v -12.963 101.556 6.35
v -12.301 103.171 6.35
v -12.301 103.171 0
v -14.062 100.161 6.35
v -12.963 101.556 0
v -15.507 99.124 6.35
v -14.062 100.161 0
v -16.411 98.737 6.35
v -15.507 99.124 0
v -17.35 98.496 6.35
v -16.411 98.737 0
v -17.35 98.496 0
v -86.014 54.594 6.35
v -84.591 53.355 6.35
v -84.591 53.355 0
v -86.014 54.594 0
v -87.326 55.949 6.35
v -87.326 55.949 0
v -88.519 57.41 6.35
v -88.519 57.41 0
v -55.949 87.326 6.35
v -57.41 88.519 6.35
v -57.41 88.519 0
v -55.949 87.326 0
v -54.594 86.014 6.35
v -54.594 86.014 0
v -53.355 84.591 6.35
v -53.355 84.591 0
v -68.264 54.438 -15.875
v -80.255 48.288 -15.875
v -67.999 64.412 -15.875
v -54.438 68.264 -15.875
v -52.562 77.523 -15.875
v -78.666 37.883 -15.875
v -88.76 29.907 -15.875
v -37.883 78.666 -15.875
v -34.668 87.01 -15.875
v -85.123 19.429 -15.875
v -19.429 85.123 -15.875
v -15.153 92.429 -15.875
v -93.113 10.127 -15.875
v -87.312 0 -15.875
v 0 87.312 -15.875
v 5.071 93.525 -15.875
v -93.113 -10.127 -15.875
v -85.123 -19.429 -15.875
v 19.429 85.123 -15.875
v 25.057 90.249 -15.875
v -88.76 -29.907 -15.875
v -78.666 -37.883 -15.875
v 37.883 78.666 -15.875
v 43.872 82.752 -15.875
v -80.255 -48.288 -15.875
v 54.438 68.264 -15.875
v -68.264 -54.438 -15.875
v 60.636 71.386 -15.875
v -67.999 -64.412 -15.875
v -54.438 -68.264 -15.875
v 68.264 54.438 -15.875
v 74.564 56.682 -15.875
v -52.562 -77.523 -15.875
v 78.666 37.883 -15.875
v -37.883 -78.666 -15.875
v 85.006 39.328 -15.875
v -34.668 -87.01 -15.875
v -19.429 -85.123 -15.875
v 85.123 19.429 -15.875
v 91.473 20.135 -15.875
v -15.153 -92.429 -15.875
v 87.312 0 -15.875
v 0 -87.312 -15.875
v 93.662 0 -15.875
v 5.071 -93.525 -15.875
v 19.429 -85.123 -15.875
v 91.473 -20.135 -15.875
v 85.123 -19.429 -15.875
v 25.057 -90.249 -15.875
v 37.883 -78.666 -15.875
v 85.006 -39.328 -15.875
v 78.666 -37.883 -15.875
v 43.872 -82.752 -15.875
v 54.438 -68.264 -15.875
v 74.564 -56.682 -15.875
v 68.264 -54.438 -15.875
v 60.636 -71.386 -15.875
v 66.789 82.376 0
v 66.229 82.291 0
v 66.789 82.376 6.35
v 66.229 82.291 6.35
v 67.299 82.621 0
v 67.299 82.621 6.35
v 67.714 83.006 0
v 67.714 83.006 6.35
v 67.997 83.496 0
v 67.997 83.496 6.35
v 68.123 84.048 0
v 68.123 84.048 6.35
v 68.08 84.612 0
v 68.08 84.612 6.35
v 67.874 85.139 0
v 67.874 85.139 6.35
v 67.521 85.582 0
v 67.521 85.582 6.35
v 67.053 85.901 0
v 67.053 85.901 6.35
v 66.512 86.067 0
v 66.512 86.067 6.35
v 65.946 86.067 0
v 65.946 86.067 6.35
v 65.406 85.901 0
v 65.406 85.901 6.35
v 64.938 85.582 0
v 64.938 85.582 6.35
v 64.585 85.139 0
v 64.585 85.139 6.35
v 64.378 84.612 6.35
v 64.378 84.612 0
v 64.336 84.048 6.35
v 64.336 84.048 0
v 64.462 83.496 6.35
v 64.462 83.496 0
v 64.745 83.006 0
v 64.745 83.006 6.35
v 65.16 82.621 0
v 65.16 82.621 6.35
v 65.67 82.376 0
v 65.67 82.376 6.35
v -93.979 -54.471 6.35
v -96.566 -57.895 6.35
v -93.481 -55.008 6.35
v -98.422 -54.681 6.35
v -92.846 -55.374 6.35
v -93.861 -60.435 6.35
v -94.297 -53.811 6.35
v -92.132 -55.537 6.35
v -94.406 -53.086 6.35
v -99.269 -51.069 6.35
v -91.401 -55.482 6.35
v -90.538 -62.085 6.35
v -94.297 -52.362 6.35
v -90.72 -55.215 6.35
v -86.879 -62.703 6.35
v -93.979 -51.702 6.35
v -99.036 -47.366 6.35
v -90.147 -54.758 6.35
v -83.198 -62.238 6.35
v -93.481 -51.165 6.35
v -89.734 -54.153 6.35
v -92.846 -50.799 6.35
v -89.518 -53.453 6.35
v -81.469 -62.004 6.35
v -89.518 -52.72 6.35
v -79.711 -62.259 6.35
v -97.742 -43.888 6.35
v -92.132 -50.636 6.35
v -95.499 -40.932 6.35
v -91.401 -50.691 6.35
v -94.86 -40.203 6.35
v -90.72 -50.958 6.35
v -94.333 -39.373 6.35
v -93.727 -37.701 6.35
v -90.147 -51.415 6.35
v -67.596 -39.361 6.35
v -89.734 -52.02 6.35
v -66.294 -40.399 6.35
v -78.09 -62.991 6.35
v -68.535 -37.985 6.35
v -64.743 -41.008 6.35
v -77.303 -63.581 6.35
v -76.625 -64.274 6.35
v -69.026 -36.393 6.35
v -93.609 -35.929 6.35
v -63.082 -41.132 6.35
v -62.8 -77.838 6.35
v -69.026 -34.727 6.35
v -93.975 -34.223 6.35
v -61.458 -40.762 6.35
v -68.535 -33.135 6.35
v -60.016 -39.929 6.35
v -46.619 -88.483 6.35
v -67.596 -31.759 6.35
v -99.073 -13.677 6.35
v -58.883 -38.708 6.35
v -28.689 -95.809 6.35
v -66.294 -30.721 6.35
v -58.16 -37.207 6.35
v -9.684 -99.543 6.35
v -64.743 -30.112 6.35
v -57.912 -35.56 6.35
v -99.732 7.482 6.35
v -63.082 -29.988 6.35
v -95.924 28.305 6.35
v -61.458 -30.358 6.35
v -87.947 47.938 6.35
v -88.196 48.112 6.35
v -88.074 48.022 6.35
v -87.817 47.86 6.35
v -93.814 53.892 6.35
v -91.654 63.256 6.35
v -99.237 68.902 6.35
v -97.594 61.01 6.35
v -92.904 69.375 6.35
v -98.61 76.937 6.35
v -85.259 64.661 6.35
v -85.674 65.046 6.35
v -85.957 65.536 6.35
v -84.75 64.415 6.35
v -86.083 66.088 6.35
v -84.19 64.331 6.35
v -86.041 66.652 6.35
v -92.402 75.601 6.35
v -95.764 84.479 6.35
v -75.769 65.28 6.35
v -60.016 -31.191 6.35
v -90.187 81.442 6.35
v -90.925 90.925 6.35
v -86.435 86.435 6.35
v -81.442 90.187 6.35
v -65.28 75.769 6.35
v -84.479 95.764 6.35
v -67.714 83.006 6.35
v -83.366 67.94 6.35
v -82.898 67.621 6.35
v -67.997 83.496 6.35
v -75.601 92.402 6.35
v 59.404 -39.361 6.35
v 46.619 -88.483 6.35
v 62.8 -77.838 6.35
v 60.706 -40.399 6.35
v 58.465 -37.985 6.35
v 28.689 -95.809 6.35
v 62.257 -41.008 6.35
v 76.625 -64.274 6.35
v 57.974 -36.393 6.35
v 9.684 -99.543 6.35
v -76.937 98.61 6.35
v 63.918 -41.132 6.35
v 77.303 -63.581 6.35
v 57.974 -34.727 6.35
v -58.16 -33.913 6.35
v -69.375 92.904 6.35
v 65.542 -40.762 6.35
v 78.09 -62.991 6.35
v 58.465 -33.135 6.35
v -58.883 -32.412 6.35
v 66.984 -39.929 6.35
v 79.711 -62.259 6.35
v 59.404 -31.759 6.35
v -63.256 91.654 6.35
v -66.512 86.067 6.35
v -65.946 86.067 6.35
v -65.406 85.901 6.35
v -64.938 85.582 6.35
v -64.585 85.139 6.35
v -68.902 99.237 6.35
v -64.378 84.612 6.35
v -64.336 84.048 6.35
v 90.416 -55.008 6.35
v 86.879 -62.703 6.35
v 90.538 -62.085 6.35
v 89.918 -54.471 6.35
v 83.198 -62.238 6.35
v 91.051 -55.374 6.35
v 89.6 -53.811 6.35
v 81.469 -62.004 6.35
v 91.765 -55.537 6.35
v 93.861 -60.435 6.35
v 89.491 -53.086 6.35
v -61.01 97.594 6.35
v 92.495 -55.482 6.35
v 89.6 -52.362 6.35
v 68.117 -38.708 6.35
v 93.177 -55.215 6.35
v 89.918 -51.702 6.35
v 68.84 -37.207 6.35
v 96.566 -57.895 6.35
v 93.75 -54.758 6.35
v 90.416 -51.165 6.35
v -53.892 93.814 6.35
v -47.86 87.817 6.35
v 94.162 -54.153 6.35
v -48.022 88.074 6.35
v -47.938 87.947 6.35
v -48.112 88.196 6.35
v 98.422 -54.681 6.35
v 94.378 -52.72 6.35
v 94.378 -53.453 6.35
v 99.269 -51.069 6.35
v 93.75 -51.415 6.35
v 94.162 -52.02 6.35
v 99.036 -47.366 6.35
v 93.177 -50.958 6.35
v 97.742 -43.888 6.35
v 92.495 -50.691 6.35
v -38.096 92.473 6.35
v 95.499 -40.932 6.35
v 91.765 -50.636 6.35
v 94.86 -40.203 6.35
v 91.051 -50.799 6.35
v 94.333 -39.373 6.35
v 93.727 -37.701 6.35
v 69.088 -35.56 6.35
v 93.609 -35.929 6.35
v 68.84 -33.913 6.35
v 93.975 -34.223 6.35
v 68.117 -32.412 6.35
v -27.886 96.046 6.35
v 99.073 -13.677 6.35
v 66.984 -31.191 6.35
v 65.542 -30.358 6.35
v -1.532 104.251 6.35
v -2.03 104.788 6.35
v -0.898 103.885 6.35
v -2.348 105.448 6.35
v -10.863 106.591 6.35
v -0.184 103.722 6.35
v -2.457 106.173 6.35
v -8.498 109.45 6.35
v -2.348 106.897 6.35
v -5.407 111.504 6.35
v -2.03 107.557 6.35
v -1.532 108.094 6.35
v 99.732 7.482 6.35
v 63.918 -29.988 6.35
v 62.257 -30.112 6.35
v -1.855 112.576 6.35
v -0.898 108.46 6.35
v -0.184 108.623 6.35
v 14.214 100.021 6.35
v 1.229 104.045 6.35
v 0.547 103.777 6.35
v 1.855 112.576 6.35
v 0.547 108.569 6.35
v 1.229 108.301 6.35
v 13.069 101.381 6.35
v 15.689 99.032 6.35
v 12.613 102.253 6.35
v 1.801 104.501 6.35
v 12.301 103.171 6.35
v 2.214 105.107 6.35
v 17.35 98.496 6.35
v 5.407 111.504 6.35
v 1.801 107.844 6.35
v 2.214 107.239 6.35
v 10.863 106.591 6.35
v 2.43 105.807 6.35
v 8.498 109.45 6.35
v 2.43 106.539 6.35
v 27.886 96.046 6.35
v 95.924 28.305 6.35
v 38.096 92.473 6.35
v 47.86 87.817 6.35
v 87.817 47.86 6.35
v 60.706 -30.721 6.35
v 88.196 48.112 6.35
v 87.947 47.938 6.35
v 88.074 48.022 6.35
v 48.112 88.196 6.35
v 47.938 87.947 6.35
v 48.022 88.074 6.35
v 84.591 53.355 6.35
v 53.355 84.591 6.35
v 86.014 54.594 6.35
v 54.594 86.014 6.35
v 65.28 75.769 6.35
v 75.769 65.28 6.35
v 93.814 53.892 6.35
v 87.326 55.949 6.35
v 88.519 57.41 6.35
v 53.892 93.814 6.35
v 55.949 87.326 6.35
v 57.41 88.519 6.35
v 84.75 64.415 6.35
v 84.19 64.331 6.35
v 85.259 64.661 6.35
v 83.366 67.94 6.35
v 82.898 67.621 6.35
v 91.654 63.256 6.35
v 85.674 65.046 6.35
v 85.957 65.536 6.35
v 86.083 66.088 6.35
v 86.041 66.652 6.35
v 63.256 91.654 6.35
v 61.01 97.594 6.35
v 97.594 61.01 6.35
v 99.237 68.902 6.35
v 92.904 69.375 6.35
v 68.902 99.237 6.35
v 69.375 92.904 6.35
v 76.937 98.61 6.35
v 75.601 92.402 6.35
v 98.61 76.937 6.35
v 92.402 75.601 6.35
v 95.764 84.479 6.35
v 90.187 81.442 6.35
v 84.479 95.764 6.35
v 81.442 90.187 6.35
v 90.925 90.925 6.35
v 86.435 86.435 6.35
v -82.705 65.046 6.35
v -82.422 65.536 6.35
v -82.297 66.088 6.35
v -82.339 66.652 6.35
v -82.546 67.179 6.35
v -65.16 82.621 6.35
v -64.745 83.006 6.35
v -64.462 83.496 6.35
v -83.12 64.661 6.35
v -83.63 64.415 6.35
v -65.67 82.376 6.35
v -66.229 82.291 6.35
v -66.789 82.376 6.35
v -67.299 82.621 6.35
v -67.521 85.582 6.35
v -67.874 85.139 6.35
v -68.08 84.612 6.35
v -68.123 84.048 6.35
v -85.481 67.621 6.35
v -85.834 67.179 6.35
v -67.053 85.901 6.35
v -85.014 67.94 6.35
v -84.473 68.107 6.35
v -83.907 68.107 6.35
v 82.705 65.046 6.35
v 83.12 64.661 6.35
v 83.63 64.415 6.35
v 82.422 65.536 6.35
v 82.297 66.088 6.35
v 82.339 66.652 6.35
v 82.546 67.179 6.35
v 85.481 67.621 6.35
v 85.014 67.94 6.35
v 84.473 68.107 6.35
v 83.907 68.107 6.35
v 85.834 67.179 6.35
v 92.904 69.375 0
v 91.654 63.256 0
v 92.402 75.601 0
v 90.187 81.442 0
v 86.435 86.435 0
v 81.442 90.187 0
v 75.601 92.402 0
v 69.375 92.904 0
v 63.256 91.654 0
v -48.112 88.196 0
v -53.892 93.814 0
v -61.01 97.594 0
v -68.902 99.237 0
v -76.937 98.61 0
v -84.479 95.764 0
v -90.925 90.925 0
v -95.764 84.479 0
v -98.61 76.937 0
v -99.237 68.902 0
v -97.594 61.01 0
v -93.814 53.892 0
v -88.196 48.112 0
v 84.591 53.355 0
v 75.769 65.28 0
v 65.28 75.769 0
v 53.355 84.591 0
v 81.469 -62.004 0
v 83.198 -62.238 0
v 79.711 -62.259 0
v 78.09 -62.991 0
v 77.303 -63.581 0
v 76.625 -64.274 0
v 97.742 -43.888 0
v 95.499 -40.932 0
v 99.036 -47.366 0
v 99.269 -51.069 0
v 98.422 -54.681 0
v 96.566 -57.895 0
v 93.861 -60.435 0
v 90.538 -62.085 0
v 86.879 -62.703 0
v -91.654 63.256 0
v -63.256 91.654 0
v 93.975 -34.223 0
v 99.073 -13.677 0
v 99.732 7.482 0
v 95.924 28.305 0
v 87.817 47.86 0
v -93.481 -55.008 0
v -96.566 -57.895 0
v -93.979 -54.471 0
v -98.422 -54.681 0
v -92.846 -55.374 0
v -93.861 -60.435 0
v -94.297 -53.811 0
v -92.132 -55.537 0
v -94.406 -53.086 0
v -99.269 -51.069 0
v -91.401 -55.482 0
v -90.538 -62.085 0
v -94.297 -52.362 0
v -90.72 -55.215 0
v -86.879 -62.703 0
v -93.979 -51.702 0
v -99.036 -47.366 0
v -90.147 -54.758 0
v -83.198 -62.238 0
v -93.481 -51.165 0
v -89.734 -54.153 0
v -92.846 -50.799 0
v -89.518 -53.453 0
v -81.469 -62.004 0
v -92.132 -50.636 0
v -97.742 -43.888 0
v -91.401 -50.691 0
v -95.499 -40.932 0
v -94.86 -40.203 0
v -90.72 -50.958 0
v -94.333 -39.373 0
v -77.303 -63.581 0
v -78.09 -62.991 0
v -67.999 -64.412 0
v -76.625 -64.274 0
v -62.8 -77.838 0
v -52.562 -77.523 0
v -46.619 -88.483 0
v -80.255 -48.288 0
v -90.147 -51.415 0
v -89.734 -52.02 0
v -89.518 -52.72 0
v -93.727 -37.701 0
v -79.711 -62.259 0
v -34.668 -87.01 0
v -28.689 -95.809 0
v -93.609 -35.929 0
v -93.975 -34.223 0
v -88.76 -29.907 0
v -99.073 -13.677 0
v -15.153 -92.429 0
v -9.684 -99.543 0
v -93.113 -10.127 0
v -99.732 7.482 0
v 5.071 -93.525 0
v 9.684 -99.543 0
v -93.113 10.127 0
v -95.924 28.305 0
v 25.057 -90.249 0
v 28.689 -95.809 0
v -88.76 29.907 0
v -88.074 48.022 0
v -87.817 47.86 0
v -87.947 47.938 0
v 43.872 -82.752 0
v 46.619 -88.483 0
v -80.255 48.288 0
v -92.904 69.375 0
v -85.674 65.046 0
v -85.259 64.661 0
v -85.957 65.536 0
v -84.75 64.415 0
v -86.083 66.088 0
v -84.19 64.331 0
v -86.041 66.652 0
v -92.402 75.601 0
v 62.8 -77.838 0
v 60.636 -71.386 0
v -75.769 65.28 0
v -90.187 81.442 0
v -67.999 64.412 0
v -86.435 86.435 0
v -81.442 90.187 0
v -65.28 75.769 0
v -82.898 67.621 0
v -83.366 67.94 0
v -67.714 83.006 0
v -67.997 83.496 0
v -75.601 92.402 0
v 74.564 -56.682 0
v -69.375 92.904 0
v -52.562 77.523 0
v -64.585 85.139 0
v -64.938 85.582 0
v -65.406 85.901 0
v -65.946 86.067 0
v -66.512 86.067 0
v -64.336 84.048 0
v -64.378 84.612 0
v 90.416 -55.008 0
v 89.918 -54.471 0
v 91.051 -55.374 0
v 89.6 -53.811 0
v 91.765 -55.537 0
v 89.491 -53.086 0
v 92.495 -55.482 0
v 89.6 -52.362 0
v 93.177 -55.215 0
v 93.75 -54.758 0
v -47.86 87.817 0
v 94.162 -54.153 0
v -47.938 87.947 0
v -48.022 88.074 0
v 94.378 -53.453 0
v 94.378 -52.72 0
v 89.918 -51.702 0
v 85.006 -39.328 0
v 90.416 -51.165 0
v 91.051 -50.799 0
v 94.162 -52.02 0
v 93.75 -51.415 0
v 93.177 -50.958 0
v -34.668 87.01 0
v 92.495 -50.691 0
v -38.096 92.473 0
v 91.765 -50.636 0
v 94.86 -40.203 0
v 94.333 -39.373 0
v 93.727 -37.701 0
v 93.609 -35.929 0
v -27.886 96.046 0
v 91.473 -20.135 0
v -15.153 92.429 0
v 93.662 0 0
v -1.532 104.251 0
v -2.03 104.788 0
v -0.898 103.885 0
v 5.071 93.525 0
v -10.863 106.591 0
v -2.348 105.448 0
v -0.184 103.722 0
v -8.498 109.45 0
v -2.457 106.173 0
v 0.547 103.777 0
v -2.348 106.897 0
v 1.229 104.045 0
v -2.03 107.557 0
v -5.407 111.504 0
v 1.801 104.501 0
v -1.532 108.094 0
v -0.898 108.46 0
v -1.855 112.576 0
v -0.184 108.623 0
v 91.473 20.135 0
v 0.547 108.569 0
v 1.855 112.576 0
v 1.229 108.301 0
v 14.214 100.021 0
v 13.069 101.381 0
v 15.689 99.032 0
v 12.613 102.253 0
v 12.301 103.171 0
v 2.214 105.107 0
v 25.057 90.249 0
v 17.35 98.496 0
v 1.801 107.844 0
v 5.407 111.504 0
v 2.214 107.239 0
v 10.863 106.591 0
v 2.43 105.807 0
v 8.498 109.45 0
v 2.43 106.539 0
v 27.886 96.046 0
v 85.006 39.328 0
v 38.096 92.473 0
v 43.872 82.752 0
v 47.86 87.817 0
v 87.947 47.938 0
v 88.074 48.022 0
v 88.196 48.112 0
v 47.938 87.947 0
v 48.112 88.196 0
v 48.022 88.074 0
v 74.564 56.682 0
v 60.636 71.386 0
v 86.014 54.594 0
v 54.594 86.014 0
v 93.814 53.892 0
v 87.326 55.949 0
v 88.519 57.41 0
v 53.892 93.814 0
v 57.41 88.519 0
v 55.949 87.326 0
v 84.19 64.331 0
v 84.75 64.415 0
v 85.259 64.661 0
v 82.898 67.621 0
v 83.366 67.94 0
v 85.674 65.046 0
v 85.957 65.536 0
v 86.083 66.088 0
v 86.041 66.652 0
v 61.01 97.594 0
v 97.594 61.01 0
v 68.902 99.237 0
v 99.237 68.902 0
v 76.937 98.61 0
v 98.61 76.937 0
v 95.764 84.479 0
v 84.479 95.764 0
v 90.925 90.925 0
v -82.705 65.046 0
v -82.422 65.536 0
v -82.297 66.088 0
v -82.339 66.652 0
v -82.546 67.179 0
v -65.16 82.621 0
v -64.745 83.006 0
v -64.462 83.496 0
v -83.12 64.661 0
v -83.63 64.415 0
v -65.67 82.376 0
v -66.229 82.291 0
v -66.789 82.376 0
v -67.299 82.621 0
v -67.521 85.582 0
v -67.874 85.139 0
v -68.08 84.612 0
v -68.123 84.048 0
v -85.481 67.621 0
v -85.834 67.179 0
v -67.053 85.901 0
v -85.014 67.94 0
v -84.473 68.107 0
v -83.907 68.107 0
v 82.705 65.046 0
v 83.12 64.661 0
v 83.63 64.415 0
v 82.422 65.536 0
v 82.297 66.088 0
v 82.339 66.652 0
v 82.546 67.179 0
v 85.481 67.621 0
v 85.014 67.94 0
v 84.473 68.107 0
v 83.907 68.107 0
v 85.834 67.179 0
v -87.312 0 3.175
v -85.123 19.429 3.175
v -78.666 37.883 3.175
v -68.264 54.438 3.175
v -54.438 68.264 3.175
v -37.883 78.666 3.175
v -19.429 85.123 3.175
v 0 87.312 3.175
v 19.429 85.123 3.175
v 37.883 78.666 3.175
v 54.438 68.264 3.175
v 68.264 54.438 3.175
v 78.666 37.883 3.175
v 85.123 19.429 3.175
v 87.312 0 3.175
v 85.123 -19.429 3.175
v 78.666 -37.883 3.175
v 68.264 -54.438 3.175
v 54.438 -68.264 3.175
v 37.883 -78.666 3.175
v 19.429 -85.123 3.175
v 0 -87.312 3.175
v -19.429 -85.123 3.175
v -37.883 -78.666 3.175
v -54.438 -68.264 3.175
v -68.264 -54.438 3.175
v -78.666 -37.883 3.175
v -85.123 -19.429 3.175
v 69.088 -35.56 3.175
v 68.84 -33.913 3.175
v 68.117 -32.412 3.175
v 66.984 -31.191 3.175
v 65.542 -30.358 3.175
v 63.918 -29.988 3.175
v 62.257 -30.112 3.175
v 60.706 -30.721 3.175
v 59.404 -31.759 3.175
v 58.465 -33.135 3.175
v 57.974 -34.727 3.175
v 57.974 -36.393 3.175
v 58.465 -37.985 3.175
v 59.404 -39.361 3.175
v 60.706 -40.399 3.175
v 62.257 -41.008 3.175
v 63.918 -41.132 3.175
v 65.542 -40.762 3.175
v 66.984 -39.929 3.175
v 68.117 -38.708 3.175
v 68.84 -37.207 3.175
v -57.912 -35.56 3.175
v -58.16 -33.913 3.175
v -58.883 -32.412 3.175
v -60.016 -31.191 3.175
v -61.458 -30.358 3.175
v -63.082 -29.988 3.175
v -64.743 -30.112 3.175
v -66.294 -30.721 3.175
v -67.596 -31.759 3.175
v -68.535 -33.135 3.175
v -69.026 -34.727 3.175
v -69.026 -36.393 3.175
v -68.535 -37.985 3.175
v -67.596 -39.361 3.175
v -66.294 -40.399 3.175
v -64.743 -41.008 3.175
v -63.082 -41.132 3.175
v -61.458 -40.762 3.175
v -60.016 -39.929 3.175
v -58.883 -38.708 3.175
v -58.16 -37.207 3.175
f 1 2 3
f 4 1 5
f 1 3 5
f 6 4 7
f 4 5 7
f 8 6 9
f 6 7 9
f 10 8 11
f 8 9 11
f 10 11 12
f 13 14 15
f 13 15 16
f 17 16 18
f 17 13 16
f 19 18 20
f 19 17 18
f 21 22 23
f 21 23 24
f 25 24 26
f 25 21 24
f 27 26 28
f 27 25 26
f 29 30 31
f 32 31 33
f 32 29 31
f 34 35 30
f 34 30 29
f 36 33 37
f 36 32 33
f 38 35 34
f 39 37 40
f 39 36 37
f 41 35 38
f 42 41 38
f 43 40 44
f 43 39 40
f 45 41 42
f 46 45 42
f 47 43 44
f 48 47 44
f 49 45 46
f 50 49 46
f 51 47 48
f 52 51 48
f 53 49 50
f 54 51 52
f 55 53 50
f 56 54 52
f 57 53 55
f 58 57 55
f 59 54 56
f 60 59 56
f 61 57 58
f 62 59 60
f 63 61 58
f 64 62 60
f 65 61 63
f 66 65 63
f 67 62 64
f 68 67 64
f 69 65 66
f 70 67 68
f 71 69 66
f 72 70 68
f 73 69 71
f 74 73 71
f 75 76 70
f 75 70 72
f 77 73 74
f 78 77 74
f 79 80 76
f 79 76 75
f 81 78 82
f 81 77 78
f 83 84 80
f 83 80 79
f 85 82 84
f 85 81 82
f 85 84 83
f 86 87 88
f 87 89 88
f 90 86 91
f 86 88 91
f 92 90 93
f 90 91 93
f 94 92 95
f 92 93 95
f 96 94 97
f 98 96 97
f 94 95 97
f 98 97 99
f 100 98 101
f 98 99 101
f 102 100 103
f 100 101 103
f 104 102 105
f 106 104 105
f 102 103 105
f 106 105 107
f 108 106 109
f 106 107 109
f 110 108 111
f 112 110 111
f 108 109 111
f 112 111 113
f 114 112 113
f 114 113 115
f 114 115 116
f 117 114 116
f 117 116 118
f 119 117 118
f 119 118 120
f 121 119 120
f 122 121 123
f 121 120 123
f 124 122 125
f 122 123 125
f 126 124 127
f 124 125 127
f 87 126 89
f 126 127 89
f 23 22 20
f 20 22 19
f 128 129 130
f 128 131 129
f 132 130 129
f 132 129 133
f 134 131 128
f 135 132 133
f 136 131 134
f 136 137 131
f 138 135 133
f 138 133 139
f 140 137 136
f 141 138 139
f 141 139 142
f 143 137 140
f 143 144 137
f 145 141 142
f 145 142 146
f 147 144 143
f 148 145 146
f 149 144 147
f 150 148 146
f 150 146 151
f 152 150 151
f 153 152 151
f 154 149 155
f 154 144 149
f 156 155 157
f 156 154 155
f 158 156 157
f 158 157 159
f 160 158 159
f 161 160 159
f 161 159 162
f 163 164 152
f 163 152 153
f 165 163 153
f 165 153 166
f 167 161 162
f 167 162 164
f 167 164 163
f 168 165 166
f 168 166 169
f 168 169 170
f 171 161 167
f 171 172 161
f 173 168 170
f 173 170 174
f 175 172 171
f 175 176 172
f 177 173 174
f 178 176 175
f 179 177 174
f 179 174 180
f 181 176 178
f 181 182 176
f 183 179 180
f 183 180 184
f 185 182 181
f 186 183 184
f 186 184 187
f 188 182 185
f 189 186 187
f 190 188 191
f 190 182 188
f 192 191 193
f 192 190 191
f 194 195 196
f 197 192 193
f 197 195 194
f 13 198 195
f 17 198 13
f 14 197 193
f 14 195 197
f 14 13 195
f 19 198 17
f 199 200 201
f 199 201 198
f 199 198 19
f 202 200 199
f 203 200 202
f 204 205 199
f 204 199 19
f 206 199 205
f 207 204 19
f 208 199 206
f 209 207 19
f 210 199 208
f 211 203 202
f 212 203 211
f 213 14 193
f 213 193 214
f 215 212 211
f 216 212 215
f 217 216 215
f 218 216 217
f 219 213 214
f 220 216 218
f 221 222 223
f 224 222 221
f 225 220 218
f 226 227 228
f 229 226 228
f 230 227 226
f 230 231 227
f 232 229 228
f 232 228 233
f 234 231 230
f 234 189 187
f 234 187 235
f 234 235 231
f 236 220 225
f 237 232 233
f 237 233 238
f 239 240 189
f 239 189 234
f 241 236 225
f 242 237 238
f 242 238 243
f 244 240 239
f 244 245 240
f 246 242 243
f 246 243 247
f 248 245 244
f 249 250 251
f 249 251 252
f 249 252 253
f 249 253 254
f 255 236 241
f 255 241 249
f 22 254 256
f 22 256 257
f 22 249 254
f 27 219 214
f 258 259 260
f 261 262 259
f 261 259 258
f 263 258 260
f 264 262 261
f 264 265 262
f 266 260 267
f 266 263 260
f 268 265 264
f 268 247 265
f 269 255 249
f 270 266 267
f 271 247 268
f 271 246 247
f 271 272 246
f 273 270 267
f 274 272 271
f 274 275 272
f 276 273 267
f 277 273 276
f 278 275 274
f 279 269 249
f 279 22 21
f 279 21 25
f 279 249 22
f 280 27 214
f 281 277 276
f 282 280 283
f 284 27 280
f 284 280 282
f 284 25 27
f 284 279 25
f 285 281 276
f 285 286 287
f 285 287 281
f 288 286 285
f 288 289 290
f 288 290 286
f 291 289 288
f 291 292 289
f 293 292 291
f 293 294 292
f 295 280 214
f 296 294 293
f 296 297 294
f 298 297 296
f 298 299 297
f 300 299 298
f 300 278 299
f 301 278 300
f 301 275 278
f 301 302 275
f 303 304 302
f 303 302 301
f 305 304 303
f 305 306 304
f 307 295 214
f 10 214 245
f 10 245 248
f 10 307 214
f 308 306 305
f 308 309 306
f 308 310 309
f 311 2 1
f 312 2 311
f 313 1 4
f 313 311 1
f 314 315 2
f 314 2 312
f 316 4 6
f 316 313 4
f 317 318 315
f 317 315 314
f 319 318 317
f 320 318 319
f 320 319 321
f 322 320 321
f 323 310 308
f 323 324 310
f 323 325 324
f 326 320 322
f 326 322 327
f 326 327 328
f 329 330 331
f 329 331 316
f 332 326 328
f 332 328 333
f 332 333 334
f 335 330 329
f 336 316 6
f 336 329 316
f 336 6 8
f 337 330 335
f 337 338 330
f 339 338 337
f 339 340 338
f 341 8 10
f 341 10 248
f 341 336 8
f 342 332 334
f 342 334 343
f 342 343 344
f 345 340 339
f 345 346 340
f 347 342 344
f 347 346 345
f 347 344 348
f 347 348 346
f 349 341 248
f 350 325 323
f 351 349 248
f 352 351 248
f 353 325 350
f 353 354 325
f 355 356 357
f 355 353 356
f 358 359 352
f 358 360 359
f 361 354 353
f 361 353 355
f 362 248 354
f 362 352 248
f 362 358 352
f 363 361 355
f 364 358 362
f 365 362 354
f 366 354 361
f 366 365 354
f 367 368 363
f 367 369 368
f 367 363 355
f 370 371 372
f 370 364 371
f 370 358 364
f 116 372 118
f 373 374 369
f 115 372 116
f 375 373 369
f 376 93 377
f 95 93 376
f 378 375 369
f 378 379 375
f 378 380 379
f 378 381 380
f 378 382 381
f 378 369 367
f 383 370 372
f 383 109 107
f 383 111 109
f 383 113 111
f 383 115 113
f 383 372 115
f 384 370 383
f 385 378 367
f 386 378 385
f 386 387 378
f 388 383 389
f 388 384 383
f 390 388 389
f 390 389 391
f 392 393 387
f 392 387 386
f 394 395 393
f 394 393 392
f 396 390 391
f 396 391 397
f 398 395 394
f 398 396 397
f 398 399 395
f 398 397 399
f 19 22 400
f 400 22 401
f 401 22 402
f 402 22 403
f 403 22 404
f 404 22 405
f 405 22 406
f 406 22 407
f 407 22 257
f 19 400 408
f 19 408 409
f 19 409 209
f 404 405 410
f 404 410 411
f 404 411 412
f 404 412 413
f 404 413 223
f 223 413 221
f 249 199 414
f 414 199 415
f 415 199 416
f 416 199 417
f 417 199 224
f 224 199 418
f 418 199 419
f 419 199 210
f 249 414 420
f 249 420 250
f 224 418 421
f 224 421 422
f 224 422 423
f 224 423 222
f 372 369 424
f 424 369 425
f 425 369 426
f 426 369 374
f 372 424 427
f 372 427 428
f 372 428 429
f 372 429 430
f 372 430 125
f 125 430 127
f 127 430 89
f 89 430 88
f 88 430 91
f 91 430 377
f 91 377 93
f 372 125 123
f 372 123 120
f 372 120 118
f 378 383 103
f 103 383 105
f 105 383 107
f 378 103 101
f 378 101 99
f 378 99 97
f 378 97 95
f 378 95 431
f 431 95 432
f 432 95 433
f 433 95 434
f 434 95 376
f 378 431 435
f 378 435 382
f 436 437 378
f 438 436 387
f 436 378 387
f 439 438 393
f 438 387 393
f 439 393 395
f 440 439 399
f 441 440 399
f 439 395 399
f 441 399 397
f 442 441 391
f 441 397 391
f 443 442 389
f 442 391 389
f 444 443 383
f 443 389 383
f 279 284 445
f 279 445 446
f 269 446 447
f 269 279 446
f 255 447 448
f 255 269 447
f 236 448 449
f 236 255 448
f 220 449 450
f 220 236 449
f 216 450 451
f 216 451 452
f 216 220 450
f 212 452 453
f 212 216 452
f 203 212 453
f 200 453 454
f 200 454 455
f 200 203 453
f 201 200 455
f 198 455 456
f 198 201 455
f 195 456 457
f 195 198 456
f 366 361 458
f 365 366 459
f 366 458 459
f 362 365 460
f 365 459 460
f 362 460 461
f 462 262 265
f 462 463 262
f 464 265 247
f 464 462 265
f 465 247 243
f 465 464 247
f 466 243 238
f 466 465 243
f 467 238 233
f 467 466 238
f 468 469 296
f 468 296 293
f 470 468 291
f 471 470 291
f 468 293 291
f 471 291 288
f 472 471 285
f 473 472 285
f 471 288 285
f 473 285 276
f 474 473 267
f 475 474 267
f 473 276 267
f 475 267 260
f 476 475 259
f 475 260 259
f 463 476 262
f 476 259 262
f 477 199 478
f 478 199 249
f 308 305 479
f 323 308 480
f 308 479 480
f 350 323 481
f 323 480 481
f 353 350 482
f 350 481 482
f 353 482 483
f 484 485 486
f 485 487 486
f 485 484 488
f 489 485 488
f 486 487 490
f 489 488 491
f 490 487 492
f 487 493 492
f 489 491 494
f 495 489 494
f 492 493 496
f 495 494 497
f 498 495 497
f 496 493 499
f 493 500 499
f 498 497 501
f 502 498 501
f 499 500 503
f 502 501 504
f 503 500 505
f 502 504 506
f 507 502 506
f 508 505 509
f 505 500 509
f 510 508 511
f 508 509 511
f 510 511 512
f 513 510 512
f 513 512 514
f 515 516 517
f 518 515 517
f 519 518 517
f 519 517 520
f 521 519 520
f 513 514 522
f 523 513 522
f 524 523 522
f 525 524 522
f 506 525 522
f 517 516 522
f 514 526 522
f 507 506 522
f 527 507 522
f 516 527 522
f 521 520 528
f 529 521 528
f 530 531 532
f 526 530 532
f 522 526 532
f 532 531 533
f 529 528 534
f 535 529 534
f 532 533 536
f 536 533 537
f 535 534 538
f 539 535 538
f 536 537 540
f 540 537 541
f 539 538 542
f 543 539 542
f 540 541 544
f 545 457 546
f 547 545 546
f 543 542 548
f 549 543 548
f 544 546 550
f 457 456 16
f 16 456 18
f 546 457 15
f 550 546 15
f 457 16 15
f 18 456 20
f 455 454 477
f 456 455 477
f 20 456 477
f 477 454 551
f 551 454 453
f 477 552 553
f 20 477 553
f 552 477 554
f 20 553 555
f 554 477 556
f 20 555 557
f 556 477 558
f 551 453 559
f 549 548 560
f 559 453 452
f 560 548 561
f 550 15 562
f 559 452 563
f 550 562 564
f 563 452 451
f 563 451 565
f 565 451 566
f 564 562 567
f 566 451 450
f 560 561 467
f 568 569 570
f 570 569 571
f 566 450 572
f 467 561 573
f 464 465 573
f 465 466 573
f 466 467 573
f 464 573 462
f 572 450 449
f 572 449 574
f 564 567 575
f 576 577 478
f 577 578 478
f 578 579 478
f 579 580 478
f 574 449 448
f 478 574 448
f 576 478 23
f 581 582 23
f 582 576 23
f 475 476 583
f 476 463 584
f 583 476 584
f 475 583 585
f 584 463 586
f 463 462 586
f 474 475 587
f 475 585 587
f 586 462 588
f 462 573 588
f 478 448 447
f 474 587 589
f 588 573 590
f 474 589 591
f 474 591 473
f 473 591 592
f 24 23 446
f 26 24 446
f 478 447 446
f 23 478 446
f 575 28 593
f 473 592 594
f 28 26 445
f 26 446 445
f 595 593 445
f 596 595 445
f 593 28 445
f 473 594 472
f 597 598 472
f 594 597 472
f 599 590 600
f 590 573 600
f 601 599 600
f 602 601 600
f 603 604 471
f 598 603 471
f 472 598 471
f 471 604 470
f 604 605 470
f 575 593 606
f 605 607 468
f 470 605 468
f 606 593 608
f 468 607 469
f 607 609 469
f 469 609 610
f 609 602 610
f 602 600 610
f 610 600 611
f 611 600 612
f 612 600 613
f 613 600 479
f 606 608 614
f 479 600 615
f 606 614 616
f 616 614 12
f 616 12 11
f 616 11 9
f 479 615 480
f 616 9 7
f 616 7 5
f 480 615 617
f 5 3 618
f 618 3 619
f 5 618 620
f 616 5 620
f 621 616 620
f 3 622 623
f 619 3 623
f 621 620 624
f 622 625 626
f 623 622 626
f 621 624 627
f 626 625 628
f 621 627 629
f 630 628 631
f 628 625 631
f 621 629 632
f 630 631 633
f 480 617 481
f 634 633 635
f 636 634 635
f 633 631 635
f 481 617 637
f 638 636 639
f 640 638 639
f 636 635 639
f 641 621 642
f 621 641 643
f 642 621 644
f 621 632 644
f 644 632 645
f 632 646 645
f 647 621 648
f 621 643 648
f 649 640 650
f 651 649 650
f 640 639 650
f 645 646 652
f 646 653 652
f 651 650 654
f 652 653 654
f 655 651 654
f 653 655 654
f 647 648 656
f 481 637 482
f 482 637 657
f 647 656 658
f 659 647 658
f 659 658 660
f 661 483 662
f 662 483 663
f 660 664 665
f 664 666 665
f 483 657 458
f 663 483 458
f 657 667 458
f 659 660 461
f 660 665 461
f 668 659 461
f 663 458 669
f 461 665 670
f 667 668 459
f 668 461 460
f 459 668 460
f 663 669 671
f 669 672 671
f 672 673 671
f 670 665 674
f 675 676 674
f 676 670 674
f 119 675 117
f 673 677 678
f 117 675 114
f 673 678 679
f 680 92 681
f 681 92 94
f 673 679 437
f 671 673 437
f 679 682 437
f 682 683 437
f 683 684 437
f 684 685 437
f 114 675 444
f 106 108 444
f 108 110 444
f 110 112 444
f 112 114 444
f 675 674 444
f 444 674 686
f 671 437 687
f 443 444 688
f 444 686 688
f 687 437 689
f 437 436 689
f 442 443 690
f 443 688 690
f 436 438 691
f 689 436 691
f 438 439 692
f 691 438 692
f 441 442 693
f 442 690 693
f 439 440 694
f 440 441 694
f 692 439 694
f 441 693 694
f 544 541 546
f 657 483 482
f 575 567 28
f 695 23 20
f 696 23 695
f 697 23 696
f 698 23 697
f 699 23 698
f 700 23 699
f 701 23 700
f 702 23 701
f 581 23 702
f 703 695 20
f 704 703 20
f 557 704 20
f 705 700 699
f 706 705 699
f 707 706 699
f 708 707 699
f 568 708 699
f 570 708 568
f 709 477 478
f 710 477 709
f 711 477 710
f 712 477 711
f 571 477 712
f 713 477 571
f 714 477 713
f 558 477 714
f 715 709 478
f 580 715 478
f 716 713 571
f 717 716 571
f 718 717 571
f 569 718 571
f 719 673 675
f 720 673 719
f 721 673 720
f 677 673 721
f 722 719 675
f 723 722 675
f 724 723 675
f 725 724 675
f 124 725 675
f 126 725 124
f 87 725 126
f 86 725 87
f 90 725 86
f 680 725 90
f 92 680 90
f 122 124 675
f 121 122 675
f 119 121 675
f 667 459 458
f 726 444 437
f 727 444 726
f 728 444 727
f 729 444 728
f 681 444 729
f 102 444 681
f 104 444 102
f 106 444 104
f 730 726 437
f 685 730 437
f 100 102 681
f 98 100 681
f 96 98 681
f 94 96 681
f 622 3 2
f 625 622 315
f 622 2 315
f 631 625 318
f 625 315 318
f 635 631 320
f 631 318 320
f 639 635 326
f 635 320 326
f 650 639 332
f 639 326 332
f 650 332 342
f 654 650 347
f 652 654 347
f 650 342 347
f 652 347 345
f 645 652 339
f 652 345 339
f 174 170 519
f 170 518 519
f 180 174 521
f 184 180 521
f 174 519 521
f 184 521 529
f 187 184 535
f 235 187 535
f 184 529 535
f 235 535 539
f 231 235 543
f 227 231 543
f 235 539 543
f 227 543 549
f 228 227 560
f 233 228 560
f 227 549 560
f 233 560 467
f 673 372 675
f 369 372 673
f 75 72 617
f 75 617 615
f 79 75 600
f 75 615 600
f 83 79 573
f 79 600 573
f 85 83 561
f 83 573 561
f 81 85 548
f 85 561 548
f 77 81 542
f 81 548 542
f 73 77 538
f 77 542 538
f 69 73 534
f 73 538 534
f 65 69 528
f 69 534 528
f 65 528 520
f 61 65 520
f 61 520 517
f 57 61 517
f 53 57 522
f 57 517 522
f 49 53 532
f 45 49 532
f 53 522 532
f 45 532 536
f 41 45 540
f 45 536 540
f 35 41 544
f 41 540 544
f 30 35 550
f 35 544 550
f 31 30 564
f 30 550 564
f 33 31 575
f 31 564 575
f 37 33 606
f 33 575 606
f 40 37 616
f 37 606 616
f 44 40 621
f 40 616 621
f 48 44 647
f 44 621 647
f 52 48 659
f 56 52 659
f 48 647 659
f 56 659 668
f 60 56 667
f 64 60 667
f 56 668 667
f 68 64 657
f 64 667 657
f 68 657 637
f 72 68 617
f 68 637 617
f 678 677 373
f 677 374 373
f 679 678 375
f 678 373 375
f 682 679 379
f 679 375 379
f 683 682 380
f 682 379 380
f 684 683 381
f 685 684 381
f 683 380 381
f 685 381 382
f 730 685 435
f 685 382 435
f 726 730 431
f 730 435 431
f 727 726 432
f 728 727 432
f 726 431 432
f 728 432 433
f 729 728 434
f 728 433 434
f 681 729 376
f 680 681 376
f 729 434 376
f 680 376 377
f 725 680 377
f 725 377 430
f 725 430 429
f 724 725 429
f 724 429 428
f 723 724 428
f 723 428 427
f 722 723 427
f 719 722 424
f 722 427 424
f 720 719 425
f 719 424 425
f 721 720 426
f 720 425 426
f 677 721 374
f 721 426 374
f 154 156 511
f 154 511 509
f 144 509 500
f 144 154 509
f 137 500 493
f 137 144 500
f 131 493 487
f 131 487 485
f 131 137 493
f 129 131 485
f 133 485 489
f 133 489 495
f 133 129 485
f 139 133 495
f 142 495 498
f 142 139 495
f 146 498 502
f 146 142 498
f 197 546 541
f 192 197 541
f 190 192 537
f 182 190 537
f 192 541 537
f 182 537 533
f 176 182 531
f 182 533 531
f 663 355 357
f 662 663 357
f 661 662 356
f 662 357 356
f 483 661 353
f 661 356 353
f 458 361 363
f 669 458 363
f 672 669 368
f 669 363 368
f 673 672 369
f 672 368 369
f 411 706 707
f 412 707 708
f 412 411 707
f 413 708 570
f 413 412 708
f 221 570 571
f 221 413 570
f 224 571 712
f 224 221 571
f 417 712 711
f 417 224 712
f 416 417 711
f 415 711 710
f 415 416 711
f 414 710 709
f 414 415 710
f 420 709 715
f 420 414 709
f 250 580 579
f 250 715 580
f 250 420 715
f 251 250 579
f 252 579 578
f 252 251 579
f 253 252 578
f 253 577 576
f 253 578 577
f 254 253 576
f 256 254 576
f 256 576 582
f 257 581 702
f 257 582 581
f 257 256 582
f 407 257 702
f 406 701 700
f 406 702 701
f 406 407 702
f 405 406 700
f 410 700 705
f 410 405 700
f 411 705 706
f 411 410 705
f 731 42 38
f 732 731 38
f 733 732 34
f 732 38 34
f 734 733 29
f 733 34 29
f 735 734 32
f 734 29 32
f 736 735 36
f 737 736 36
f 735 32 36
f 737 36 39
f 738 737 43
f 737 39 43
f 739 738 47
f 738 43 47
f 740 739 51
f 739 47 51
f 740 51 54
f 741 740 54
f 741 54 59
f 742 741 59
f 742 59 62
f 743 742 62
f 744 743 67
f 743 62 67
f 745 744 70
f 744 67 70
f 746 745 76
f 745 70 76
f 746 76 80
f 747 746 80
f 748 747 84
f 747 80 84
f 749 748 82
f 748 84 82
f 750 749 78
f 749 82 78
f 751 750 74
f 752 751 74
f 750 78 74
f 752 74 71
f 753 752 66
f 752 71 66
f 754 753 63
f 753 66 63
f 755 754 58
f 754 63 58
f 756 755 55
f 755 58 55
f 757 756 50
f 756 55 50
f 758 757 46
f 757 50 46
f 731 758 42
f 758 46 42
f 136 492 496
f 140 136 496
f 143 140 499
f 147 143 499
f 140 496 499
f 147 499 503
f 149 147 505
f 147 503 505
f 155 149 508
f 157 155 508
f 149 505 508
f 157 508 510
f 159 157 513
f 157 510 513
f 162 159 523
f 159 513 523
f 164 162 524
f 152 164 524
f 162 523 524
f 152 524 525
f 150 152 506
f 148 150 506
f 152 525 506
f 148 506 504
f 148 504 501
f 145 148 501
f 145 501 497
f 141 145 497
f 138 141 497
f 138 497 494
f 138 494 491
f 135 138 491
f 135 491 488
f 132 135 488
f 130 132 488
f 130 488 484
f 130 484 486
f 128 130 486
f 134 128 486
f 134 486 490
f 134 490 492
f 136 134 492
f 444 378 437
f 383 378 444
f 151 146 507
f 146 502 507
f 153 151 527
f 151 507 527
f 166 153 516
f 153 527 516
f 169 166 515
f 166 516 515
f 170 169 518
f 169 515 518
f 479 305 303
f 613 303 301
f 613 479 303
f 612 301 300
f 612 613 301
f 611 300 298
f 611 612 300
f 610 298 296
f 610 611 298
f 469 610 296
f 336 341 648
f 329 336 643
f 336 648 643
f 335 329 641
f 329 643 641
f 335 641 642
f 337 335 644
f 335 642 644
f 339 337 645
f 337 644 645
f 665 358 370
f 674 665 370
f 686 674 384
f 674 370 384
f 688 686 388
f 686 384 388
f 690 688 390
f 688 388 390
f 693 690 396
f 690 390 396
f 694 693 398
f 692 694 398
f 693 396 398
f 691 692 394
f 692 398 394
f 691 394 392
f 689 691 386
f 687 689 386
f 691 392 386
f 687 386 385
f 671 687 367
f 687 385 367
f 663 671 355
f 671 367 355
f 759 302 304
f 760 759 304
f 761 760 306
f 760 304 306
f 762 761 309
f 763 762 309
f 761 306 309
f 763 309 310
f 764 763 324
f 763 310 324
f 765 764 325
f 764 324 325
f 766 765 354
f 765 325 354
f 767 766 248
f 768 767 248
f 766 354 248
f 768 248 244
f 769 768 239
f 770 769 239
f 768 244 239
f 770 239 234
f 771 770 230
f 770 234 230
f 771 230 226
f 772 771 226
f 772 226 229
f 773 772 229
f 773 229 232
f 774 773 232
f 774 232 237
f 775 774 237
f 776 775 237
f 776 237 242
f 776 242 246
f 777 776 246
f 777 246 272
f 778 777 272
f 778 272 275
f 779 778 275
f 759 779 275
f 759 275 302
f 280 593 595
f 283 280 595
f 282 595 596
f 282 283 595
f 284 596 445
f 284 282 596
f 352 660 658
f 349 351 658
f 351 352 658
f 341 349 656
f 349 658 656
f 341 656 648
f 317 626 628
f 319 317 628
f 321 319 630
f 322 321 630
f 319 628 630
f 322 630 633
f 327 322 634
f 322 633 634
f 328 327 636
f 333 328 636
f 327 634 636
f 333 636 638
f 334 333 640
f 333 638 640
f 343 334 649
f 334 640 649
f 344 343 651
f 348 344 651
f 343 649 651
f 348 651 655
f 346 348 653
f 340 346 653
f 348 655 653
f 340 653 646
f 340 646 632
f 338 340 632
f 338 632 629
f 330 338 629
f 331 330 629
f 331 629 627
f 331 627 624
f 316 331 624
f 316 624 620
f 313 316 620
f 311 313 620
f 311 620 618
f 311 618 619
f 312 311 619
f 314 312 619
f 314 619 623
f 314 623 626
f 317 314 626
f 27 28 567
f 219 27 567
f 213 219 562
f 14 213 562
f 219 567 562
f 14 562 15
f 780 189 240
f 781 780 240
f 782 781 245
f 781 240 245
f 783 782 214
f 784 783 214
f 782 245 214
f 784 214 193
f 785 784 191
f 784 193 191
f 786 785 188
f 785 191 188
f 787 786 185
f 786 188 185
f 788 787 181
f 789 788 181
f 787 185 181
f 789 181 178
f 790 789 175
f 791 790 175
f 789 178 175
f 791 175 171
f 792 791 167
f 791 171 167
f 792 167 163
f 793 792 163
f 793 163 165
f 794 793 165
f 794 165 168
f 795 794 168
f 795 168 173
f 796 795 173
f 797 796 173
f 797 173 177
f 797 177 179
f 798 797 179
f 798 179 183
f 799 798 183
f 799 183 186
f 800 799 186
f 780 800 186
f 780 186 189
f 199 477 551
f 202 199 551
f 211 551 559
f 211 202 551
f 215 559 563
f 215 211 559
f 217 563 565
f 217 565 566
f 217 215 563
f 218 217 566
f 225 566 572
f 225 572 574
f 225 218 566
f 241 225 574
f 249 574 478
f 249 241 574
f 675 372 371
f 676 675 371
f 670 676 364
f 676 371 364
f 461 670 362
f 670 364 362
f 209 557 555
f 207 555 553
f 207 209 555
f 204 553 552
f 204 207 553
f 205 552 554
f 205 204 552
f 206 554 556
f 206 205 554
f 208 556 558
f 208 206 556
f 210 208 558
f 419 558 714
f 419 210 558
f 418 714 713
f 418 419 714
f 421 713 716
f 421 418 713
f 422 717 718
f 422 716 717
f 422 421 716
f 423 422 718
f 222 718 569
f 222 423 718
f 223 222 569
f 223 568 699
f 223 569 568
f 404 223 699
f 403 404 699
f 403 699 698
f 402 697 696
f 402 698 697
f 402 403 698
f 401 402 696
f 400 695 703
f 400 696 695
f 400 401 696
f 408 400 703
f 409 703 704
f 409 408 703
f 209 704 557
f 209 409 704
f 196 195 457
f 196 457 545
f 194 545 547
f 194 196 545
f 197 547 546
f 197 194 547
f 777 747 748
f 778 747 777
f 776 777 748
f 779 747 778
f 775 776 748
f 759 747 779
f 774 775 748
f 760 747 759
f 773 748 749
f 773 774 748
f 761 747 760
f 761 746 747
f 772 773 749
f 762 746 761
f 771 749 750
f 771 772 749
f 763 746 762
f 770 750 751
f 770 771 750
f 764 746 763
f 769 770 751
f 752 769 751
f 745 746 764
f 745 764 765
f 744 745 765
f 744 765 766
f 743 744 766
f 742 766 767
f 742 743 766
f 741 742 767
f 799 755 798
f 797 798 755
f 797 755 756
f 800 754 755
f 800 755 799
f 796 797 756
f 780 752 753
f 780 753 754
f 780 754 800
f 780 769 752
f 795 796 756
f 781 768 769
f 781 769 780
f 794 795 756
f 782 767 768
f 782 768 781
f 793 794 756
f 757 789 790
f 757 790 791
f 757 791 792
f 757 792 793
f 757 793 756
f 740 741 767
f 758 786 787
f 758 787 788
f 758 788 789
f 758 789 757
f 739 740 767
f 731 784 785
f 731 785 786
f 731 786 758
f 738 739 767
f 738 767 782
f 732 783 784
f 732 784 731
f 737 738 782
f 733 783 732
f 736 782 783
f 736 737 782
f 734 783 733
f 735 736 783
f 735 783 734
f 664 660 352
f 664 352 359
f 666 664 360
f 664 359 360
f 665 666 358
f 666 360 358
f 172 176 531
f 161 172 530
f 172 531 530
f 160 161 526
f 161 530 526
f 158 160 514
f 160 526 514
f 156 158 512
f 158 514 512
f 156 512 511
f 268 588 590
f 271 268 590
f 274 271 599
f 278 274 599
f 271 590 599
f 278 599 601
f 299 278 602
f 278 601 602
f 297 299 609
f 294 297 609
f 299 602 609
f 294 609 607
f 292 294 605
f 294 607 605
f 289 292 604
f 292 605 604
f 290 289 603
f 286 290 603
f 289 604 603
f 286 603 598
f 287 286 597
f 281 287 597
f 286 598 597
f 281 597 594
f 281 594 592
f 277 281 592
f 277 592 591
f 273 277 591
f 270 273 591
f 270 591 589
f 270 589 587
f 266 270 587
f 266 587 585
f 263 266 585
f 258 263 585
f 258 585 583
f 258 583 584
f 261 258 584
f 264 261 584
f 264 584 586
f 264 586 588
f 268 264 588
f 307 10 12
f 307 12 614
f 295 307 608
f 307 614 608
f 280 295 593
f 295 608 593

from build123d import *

# Parameters (mm, degrees)
SKETCH1_R                        = 100.0125
EXTRUDE1_DEPTH                   = 6.35
SKETCH2_R                        = 93.6625
EXTRUDE2_DEPTH                   = 15.875
SKETCH3_R                        = 87.3125
CUT_EXTRUDE1_DEPTH               = 19.05
EXTRUDE3_DEPTH                   = 6.35
SKETCH5_R                        = 5.588
CUT_EXTRUDE2_DEPTH               = 153.317295267
F_10_0_1935_DIAMETER_HOLE1_D     = 4.9149
F_10_0_1935_DIAMETER_HOLE1_DEPTH = 330.2
F_10_0_1935_DIAMETER_HOLE1_TIP   = 1.476584928
FILLET1_R                        = 6.35
BOSS_EXTRUDE1_DEPTH              = 6.35
BOSS_EXTRUDE2_DEPTH              = 6.35
F_6_CLEARANCE_HOLE1_AT_2_COUNT   = 2
F_6_CLEARANCE_HOLE1_AT_2_PITCH   = 25.4


with BuildPart() as part:
    # Sketch1 → Extrude1 (new body)
    with BuildSketch(Plane.XY):
        Circle(SKETCH1_R)
    extrude(amount=EXTRUDE1_DEPTH)

    # Sketch2 → Extrude2 (add)
    with BuildSketch(Plane(origin=(0, 0, 0), x_dir=(-1, 0, 0), z_dir=(0, 0, -1))):
        with Locations(Location((0, 0, 0), (0, 0, 180))):
            Circle(SKETCH2_R)
    extrude(amount=EXTRUDE2_DEPTH)

    # Sketch3 → Cut-Extrude1 (cut)
    with BuildSketch(Plane(origin=(0, 0, -15.875), x_dir=(-1, 0, 0), z_dir=(0, 0, -1))):
        Circle(SKETCH3_R)
    extrude(amount=-CUT_EXTRUDE1_DEPTH, mode=Mode.SUBTRACT)

    # Sketch8 → Extrude3 (add)
    with BuildSketch(Plane.XY.offset(6.35)):
        with BuildLine():
            ThreePointArc((-12.674375762, 99.206150794), (0, 112.7125), (12.674375762, 99.206150794))
            ThreePointArc((12.674375762, 99.206150794), (0, 100.0125), (-12.674375762, 99.206150794))
        make_face()
        with BuildLine():
            ThreePointArc((92.25223468, -38.62674401), (97.611888324, -56.35625), (79.577858918, -60.579406784))
            ThreePointArc((79.577858918, -60.579406784), (86.613365696, -50.00625), (92.25223468, -38.62674401))
        make_face()
        with BuildLine():
            ThreePointArc((-92.25223468, -38.62674401), (-97.611888324, -56.35625), (-79.577858918, -60.579406784))
            ThreePointArc((-79.577858918, -60.579406784), (-86.613365696, -50.00625), (-92.25223468, -38.62674401))
        make_face()
    extrude(amount=-EXTRUDE3_DEPTH)

    # Sketch5 → Cut-Extrude2 (cut, through all)
    with BuildSketch(Plane.XY.offset(6.35)):
        with Locations((-63.5, -35.56)):
            Circle(SKETCH5_R)
        with Locations((63.5, -35.56)):
            Circle(SKETCH5_R)
    extrude(amount=-CUT_EXTRUDE2_DEPTH, mode=Mode.SUBTRACT)

    # #10 (0.1935) Diameter Hole1
    with Locations(Plane(origin=(0, 106.172778556, 6.35), x_dir=(1, 0, 0), z_dir=(0, 0, 1))):
        with Locations((0, 0), (91.94832342, -159.259167834), (-91.94832342, -159.259167834)):
            Hole(F_10_0_1935_DIAMETER_HOLE1_D / 2, depth=F_10_0_1935_DIAMETER_HOLE1_DEPTH)
            with Locations((0, 0, -(F_10_0_1935_DIAMETER_HOLE1_DEPTH + F_10_0_1935_DIAMETER_HOLE1_TIP / 2))):  # 118° drill point
                Cone(0, F_10_0_1935_DIAMETER_HOLE1_D / 2, F_10_0_1935_DIAMETER_HOLE1_TIP, mode=Mode.SUBTRACT)

    # Fillet1
    fillet1_edges = [part.edges().sort_by_distance(p)[0] for p in [
        (12.674375762, 99.206150794, 3.175),
        (-12.674375762, 99.206150794, 3.175),
        (79.577858918, -60.579406784, 3.175),
        (92.25223468, -38.62674401, 3.175),
        (-92.25223468, -38.62674401, 3.175),
        (-79.577858918, -60.579406784, 3.175),
    ]]
    fillet(fillet1_edges, radius=FILLET1_R)

    # Sketch25 → Boss-Extrude1 (add)
    with BuildSketch(Plane.XY.offset(6.35)):
        with BuildLine():
            ThreePointArc((-84.312132199, 53.135676765), (-86.434965165, 86.434965165), (-53.135676765, 84.312132199))
            ThreePointArc((-53.135676765, 84.312132199), (-48.681897417, 83.741957207), (-48.111722425, 88.195736555))
            ThreePointArc((-48.111722425, 88.195736555), (-90.925093226, 90.925093226), (-88.195736555, 48.111722425))
            ThreePointArc((-88.195736555, 48.111722425), (-83.741957207, 48.681897417), (-84.312132199, 53.135676765))
        make_face()
    boss_extrude1 = extrude(amount=-BOSS_EXTRUDE1_DEPTH)

    # Sketch26 → Boss-Extrude2 (add)
    with BuildSketch(Plane.XY.offset(6.35)):
        Polygon((-93.170157256, 61.739260832), (-61.739260832, 93.170157256), (-57.249132772, 88.680029196), (-88.680029196, 57.249132772), align=None)
    boss_extrude2 = extrude(amount=-BOSS_EXTRUDE2_DEPTH)

    # Sketch27 → #6 Clearance Hole1 (revolve, cut)
    with BuildSketch(Plane(origin=(-84.189901135, 66.229388893, 6.35), x_dir=(0, -1, 0), z_dir=(1, 0, 0))):
        Polygon((0, 0), (0, 26.540824014), (1.89865, 25.4), (1.89865, 0), align=None)
    f_6_clearance_hole1 = revolve(axis=Axis((-84.189901135, 66.229388893, 12.7), (0, 0, -1)), mode=Mode.SUBTRACT)

    # #6 Clearance Hole1 at 2: #6 Clearance Hole1 ×2
    with Locations(*[Vector(0.7071067811865465, 0.7071067811865487, 0) * (i * F_6_CLEARANCE_HOLE1_AT_2_PITCH) for i in range(1, F_6_CLEARANCE_HOLE1_AT_2_COUNT)]):
        add(f_6_clearance_hole1, mode=Mode.SUBTRACT)

    # Mirror1: Boss-Extrude1, Boss-Extrude2, #6 Clearance Hole1 across plane
    add(boss_extrude1.mirror(Plane(origin=(0, 0, 0), x_dir=(0, 0, 1), z_dir=(1, 0, 0))))
    add(boss_extrude2.mirror(Plane(origin=(0, 0, 0), x_dir=(0, 0, 1), z_dir=(1, 0, 0))))
    add(f_6_clearance_hole1.mirror(Plane(origin=(0, 0, 0), x_dir=(0, 0, 1), z_dir=(1, 0, 0))), mode=Mode.SUBTRACT)

    # Mirror1 copy 1 sketch → Mirror1 copy 1 (revolve, cut)
    with BuildSketch(Plane(origin=(66.229388893, 84.189901135, 6.35), x_dir=(0, -1, 0), z_dir=(-1, 0, 0))):
        Polygon((0, 0), (0, -26.540824014), (1.89865, -25.4), (1.89865, 0), align=None)
    revolve(axis=Axis((66.229388893, 84.189901135, 12.7), (0, 0, 1)), mode=Mode.SUBTRACT)


solid = part.part
